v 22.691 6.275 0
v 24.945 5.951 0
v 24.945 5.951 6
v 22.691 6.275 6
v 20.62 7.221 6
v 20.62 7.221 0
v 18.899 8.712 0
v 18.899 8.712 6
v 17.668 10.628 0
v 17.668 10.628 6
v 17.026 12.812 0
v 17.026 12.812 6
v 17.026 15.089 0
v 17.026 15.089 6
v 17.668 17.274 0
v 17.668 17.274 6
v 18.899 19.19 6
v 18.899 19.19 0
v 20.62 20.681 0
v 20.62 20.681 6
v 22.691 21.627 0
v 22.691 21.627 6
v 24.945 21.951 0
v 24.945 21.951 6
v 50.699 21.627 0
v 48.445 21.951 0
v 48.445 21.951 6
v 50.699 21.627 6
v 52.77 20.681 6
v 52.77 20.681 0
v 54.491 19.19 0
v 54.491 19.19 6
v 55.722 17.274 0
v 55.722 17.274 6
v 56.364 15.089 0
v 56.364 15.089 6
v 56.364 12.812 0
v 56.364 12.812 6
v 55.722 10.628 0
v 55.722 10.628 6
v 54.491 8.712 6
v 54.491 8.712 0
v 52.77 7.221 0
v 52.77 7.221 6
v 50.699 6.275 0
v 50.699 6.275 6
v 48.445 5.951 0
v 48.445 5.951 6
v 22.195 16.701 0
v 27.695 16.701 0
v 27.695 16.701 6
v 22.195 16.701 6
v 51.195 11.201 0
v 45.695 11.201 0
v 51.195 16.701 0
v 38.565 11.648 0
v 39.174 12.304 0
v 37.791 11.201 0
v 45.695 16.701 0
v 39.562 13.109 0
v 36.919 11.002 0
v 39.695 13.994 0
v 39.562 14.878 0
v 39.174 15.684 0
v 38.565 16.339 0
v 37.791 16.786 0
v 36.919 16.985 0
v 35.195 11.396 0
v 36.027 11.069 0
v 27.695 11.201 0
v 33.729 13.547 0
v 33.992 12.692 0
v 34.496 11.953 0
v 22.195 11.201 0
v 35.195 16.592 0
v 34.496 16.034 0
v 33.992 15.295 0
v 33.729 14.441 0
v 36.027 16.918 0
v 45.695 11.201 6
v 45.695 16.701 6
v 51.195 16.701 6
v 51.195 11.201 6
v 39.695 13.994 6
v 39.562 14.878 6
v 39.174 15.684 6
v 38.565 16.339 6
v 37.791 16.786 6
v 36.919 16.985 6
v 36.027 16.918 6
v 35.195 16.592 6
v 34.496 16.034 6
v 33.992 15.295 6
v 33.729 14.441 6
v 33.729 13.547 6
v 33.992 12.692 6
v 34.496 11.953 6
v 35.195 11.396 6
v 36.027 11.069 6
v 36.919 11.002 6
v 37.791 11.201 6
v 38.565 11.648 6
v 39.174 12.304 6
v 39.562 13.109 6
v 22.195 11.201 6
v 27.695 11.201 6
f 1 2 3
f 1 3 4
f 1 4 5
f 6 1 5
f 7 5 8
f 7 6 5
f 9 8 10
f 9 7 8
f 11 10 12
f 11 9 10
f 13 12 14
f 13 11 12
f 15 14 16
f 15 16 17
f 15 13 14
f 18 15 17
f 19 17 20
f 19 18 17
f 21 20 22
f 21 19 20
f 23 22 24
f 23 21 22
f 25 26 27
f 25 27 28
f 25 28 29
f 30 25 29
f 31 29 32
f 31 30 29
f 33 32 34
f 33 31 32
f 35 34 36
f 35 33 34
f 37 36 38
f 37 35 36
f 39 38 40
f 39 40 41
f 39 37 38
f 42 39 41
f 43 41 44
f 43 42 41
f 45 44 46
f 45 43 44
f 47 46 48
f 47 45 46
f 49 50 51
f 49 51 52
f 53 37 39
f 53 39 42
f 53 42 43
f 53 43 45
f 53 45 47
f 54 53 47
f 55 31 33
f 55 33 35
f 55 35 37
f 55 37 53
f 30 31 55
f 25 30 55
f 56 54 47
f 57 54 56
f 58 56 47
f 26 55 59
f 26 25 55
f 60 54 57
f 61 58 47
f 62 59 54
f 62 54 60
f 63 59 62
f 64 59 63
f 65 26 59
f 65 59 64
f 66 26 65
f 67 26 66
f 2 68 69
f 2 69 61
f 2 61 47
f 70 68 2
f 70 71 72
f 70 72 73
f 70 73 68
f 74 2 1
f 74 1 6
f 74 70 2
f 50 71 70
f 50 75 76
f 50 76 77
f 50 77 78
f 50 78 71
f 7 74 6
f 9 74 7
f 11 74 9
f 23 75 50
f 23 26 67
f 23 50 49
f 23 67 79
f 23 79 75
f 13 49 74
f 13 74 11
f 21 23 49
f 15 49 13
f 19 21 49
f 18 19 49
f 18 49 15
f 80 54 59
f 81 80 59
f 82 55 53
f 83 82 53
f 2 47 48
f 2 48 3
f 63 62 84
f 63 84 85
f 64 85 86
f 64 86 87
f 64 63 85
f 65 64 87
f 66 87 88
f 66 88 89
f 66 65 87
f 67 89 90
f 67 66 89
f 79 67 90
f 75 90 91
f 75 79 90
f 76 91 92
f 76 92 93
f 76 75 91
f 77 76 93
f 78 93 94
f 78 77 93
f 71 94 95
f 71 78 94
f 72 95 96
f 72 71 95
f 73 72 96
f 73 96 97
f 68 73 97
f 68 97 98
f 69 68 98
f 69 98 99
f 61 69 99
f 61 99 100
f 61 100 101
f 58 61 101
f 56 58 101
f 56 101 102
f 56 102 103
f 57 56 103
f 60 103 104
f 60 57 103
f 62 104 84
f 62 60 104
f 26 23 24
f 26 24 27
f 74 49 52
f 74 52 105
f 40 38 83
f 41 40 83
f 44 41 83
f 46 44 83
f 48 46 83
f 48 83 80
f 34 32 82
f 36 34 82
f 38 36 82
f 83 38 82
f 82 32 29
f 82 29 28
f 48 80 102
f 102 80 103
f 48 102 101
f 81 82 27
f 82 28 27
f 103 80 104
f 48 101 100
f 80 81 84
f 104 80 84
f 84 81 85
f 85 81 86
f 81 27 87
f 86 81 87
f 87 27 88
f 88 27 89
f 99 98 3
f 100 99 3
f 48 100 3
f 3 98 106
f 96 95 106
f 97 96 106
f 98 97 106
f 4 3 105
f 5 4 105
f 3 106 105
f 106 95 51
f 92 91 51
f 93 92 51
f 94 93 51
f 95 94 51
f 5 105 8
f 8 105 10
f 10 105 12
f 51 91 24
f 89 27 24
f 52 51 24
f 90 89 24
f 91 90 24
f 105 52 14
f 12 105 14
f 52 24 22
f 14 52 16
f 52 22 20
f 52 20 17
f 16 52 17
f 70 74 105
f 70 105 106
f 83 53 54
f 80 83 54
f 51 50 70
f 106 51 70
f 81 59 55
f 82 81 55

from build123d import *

# Parameters (mm, degrees)
MODEL_R             = 3
BOSS_EXTRUDE1_DEPTH = 6


with BuildPart() as part:
    # Model → Boss-Extrude1 (new body)
    with BuildSketch(Plane.XY):
        with BuildLine():
            Line((24.94501548, 21.95092931), (48.44501548, 21.95092931))
            ThreePointArc((48.44501548, 21.95092931), (56.44501548, 13.95092931), (48.44501548, 5.95092931))
            Line((48.44501548, 5.95092931), (24.94501548, 5.95092931))
            ThreePointArc((24.94501548, 5.95092931), (16.94501548, 13.95092931), (24.94501548, 21.95092931))
        make_face()
        with Locations((36.69501548, 13.993666272)):
            Circle(MODEL_R, mode=Mode.SUBTRACT)
        Polygon((27.69501548, 13.95092931), (27.69501548, 16.70092931), (22.19501548, 16.70092931), (22.19501548, 11.20092931), (27.69501548, 11.20092931), align=None, mode=Mode.SUBTRACT)
        Polygon((45.69501548, 13.95092931), (45.69501548, 16.70092931), (51.19501548, 16.70092931), (51.19501548, 11.20092931), (45.69501548, 11.20092931), align=None, mode=Mode.SUBTRACT)
    extrude(amount=BOSS_EXTRUDE1_DEPTH)


solid = part.part
